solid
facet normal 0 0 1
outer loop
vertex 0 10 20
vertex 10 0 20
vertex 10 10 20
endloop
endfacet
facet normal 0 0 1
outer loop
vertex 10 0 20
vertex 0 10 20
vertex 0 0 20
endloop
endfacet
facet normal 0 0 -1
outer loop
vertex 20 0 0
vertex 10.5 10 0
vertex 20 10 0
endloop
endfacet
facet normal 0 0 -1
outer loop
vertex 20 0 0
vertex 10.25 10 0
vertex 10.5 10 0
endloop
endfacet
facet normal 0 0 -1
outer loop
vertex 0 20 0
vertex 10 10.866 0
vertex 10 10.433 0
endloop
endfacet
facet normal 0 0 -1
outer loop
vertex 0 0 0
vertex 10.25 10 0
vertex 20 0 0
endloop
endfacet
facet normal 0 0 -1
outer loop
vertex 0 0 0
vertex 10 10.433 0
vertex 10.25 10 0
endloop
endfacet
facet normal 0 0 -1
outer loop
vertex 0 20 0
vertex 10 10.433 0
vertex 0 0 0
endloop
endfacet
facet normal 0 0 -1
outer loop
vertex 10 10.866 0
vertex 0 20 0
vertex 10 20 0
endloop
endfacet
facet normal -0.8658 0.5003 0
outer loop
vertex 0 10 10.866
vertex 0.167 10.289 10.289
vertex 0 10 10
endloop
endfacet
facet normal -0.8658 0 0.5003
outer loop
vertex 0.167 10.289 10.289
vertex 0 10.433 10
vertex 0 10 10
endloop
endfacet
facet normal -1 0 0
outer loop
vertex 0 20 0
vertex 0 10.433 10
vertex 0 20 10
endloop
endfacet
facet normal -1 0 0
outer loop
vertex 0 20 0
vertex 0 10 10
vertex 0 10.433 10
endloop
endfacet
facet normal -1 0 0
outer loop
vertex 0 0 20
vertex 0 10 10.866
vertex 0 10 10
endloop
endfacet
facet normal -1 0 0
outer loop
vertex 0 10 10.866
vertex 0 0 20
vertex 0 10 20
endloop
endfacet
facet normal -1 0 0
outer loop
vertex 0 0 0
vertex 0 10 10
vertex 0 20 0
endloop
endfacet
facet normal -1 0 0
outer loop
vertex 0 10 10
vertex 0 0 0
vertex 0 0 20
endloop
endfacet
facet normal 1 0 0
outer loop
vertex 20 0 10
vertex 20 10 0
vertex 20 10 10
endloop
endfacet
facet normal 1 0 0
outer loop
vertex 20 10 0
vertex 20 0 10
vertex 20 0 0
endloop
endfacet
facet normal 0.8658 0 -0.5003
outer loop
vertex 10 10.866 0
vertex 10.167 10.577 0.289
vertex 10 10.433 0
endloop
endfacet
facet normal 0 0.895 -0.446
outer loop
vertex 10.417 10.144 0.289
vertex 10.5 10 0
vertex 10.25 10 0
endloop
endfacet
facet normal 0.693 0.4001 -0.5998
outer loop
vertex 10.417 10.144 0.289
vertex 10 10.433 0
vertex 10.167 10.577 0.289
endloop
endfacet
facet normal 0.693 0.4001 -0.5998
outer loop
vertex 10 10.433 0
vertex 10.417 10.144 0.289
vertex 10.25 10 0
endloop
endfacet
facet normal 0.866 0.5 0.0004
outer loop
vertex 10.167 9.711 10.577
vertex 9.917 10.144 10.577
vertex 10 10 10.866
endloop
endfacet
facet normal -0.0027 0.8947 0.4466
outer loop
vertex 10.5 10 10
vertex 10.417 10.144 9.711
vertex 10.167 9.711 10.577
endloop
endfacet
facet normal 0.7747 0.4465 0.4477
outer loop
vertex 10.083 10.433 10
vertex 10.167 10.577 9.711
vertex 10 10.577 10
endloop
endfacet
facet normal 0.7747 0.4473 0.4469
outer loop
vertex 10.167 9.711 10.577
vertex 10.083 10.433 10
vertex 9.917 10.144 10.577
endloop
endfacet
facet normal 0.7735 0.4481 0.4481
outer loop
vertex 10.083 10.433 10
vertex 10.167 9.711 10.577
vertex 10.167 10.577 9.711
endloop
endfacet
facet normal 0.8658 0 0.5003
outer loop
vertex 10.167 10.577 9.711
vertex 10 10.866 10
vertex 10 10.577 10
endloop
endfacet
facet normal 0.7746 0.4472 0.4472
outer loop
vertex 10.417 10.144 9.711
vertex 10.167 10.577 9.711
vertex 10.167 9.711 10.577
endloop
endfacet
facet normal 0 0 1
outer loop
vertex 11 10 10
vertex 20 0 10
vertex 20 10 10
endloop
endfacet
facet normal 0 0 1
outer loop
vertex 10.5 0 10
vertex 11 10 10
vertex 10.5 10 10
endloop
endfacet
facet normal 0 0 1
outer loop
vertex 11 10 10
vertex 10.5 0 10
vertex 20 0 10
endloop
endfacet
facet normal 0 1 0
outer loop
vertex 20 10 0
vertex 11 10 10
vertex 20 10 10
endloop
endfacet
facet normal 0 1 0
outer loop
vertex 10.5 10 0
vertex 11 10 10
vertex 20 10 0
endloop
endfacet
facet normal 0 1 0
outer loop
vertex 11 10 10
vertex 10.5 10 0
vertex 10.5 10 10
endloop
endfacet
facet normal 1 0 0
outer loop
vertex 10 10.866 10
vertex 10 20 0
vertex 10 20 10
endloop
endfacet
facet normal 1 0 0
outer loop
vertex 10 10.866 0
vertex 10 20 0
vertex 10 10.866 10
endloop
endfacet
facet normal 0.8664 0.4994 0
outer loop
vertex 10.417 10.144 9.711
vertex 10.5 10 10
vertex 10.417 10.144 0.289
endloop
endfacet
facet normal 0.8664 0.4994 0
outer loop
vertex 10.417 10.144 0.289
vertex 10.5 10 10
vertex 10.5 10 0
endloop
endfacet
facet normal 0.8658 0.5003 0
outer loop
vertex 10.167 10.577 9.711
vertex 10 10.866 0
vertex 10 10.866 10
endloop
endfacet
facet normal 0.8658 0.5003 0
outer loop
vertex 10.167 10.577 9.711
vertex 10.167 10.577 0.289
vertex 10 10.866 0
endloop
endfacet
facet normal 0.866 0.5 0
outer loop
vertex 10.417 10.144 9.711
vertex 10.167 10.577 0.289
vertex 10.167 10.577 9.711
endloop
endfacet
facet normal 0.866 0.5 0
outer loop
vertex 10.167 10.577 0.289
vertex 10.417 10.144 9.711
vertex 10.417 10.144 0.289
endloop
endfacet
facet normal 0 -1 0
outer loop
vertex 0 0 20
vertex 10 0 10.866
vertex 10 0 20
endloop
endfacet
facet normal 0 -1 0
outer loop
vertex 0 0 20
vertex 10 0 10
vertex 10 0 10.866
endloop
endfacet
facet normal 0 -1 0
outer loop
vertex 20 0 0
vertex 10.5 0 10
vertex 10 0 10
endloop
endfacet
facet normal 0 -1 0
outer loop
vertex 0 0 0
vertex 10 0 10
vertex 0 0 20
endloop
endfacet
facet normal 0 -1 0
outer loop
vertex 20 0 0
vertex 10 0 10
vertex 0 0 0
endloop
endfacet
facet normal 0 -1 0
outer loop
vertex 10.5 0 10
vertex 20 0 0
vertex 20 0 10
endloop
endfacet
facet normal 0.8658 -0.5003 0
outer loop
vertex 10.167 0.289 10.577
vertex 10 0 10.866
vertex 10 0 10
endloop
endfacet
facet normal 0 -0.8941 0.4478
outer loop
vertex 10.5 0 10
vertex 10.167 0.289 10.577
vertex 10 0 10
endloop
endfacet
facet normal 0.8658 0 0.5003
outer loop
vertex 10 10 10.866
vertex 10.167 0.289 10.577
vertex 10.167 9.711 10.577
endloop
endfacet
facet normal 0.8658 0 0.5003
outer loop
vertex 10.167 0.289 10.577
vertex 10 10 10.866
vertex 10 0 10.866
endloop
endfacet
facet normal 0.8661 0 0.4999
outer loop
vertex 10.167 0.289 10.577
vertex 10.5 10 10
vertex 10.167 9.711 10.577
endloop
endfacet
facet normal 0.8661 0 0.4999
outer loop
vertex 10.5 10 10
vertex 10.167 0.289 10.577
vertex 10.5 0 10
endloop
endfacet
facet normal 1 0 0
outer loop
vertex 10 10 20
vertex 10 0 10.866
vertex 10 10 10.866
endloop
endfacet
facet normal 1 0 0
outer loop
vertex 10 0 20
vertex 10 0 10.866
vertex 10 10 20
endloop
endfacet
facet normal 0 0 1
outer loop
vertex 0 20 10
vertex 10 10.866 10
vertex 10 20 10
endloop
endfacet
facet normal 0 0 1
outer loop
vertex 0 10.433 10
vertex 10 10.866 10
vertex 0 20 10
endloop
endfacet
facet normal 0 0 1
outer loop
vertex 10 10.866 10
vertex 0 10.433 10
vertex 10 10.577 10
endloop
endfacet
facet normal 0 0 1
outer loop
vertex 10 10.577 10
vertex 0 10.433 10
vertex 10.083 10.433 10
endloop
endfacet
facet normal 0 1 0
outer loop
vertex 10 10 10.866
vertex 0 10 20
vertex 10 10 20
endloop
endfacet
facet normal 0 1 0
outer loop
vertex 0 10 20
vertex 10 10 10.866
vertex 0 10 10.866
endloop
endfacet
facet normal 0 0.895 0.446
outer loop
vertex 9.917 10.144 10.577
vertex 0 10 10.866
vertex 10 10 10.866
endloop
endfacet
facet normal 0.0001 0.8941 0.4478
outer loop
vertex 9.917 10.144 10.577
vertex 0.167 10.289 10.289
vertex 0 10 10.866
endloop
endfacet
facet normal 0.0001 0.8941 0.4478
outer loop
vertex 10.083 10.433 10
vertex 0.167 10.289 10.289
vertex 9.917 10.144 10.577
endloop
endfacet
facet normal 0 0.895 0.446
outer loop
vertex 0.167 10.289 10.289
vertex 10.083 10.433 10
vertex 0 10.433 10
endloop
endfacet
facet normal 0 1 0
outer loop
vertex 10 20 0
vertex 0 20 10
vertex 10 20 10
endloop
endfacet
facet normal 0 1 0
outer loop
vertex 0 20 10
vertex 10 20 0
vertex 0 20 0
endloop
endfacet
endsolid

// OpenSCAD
// by: Scorch
// http://www.scorchworks.com/Blog/openscad-modules-for-automatic-fillets-and-radii/
// www.scorchworks.com
// 12/29/2015

// PARAMETERS

sample_R    = 1;      // Radius of the fillet/round to be added

sample_OB   = 1000;   // Outer boundary (should be larger than model outer boundary)

sample_axis = "xyz";  // ["xyz":"xyz",x:x,y:y,z:z]
                      // axes to round choose one (x,y,z, or xyz)

sample_fn   = 6;      // number of facets on radius (per 360 degrees)

MAKE_EXAMPLE = 1;    // [0:Generate sample base part,1: Add fillets to base part,2: Add rounds to base part,3: Add fillets and rounds to base part,4: Add local fillets to base part,5: Add local rounds to base part,6: Add local fillets and local rounds to base part, 7: Show transparent local area selection box on base part]

//-1: Do not make example part
// 0: Generate sample base part
// 1: Add fillets to base part 
// 2: Add rounds to base part 
// 3: Add fillets and rounds to base part 
// 4: Add local fillets to base part 
// 5: Add local rounds to base part 
// 6: Add local fillets and local rounds to base part 
// 7: Show transparent local area selection box on base part 
//

//////////////////////////////////////////////////////////////////////////
//////////////////////////////////////////////////////////////////////////

// The add_fillets module will either auto fillet the whole model or
// a section of the model depending on if ther are one or two children.
// 1 child:       Fillet the whole model
// Two children:  Fillet the first child in the area that is
//                 intersected by the second child 
module add_fillets(R=1,OB=1000,axis="xyz",fn=10)
{
    fn_even = ceil(fn/2)*2;
    if ($children==1)
    {
        minkowski_fillets(R=R,OB=OB,axis=axis,fn=fn_even)
        {
            children(0);
        }
    }
    if ($children==2)
    {
        union()
        {
            minkowski_fillets(R=R,OB=OB,axis=axis,fn=fn_even)
            {
                intersection()
                {
                    children(0);
                    children(1);
                }
            }
            difference()
            {
                children(0);
                children(1);
            }
        }
    }
}


// The add_rounds module will either auto round the whole model or
// a section of the model depending on if ther are one or two children.
// 1 child:       Round the whole model
// Two children:  Round the first child in the area that is
//                  intersected by the second child 
module add_rounds(R=1,OB=1000,axis="xyz",fn=10)
{
    fn_even = ceil(fn/2)*2;
    if ($children==1)
    {
        minkowski_rounds(R=R,OB=OB,axis=axis,fn=fn_even)
        {
            children(0);
        }
    }
    if ($children==2)
    {
        union()
        {
            minkowski_rounds(R=R,OB=OB,axis=axis,fn=fn_even)
            {
                intersection()
                {
                    children(0);
                    minkowski()
                    {
                        children(1);
                        if (axis=="x")   rotate([0 ,90,0]) cylinder(r=R,$fn=fn_even,center=true);
                        if (axis=="y")   rotate([90,0 ,0]) cylinder(r=R,$fn=fn_even,center=true);
                        if (axis=="z")   rotate([0 ,0 ,0]) cylinder(r=R,$fn=fn_even,center=true);
                        if (axis=="xyz") sphere(r=R,$fn=fn_even);
                    }
                }
            }
            difference()
            {
                children(0);
                children(1);
            }
        }
    }
}




module minkowski_fillets(R=1,OB=1000,axis="xyz",fn=10)
{
    OBplus=OB+4*R;
    fn_even = ceil(fn/2)*2;
    echo(fn_even);
    difference()
    {
        cube([OB,OB,OB],center=true);
        minkowski()
        {   
            difference()
            {
                cube([OBplus,OBplus,OBplus],center=true);
                minkowski()
                {
                    children(0);
                    if (axis=="x")   rotate([0 ,90,0]) cylinder(r=R,$fn=fn_even,center=true);
                    if (axis=="y")   rotate([90,0 ,0]) cylinder(r=R,$fn=fn_even,center=true);
                    if (axis=="z")   rotate([0 ,0 ,0]) cylinder(r=R,$fn=fn_even,center=true);
                    if (axis=="xyz") sphere(r=R,$fn=fn);
                }
            }
            if (axis=="x")   rotate([0 ,90,0]) cylinder(r=R,$fn=fn_even,center=true);
            if (axis=="y")   rotate([90,0 ,0]) cylinder(r=R,$fn=fn_even,center=true);
            if (axis=="z")   rotate([0 ,0 ,0]) cylinder(r=R,$fn=fn_even,center=true);
            if (axis=="xyz") sphere(r=R,$fn=fn_even);
        }
    }
}


module minkowski_rounds(R=1,OB=1000,axis="xyz",fn=10)
{
    OBplus=OB+4*R;
    fn_even = ceil(fn/2)*2;
    minkowski()
    {  
        difference()
        {
            cube([OB,OB,OB],center=true);
            minkowski()
            {
                difference()
                {
                    cube([OBplus,OBplus,OBplus],center=true);
                    children(0);
                }
                if (axis=="x")   rotate([0 ,90,0]) cylinder(r=R,$fn=fn_even,center=true);
                if (axis=="y")   rotate([90,0 ,0]) cylinder(r=R,$fn=fn_even,center=true);
                if (axis=="z")   rotate([0 ,0 ,0]) cylinder(r=R,$fn=fn_even,center=true);
                if (axis=="xyz") sphere(r=R,$fn=fn_even);
            }
        }
        if (axis=="x")   rotate([0 ,90,0]) cylinder(r=R,$fn=fn,center=true);
        if (axis=="y")   rotate([90,0 ,0]) cylinder(r=R,$fn=fn,center=true);
        if (axis=="z")   rotate([0 ,0 ,0]) cylinder(r=R,$fn=fn,center=true);
        if (axis=="xyz") sphere(r=R,$fn=fn_even);      
    }
}

//////////////////////////////////////////////////////////
//The remainder of this file contains the Sample models //
//////////////////////////////////////////////////////////
// ------------------------------   
// Base sample object
// ------------------------------
if (MAKE_EXAMPLE==0)
    fillets_and_rounds_sample_object();

// ------------------------------   
// Sample add fillets
// ------------------------------
if (MAKE_EXAMPLE==1)
    render()
        add_fillets(R=sample_R,OB=sample_OB,axis=sample_axis,fn=sample_fn)
            fillets_and_rounds_sample_object();

// ------------------------------   
// Sample add rounds
// ------------------------------
if (MAKE_EXAMPLE==2)
    render()
        add_rounds(R=sample_R,OB=sample_OB,axis=sample_axis,fn=sample_fn)
            fillets_and_rounds_sample_object();
   
// ------------------------------   
// Sample add rounds and fillets
// ------------------------------
if (MAKE_EXAMPLE==3)
{
    render()
        add_fillets(R=sample_R,OB=sample_OB,axis=sample_axis,fn=sample_fn)
            add_rounds(R=sample_R,OB=sample_OB,axis=sample_axis,fn=sample_fn)
                fillets_and_rounds_sample_object();
}       

// ------------------------------   
// Sample add local fillets
// ------------------------------
if (MAKE_EXAMPLE==4)
{
    render()
        add_fillets(R=sample_R,OB=sample_OB,axis=sample_axis,fn=sample_fn)
        {
            fillets_and_rounds_sample_object();
            translate([10,10,0])cube([10,10,50],center=true);
        }
}

// ------------------------------   
// Sample add local rounds
// ------------------------------
if (MAKE_EXAMPLE==5)
{
    render()
        add_rounds(R=sample_R,OB=sample_OB,axis=sample_axis,fn=sample_fn)
        {
            fillets_and_rounds_sample_object();
            translate([10,10,0])cube([10,10,50],center=true);
        }
}

// ------------------------------   
// Sample add rounds and fillets
// ------------------------------
if (MAKE_EXAMPLE==6)
{
    render()
        add_fillets(R=sample_R,OB=sample_OB,axis=sample_axis,fn=sample_fn)
        {
            add_rounds(R=sample_R,OB=sample_OB,axis=sample_axis,fn=sample_fn)
            {
                fillets_and_rounds_sample_object();
                translate([10,10,0])cube([10,10,50],center=true);
            }
            translate([10,10,0])cube([10,10,50],center=true);
        }
}


// ------------------------------   
// Sample Show Intersecting Box
// ------------------------------
if (MAKE_EXAMPLE==7)
{
    fillets_and_rounds_sample_object();
    %translate([10,10,0])cube([10,10,50],center=true);

}

// -------------------
// Sample Object module
// -------------------
module fillets_and_rounds_sample_object()
{
    cube([10,20,10]);
    cube([20,10,10]);
    cube([10,10,20]);
}

// END
